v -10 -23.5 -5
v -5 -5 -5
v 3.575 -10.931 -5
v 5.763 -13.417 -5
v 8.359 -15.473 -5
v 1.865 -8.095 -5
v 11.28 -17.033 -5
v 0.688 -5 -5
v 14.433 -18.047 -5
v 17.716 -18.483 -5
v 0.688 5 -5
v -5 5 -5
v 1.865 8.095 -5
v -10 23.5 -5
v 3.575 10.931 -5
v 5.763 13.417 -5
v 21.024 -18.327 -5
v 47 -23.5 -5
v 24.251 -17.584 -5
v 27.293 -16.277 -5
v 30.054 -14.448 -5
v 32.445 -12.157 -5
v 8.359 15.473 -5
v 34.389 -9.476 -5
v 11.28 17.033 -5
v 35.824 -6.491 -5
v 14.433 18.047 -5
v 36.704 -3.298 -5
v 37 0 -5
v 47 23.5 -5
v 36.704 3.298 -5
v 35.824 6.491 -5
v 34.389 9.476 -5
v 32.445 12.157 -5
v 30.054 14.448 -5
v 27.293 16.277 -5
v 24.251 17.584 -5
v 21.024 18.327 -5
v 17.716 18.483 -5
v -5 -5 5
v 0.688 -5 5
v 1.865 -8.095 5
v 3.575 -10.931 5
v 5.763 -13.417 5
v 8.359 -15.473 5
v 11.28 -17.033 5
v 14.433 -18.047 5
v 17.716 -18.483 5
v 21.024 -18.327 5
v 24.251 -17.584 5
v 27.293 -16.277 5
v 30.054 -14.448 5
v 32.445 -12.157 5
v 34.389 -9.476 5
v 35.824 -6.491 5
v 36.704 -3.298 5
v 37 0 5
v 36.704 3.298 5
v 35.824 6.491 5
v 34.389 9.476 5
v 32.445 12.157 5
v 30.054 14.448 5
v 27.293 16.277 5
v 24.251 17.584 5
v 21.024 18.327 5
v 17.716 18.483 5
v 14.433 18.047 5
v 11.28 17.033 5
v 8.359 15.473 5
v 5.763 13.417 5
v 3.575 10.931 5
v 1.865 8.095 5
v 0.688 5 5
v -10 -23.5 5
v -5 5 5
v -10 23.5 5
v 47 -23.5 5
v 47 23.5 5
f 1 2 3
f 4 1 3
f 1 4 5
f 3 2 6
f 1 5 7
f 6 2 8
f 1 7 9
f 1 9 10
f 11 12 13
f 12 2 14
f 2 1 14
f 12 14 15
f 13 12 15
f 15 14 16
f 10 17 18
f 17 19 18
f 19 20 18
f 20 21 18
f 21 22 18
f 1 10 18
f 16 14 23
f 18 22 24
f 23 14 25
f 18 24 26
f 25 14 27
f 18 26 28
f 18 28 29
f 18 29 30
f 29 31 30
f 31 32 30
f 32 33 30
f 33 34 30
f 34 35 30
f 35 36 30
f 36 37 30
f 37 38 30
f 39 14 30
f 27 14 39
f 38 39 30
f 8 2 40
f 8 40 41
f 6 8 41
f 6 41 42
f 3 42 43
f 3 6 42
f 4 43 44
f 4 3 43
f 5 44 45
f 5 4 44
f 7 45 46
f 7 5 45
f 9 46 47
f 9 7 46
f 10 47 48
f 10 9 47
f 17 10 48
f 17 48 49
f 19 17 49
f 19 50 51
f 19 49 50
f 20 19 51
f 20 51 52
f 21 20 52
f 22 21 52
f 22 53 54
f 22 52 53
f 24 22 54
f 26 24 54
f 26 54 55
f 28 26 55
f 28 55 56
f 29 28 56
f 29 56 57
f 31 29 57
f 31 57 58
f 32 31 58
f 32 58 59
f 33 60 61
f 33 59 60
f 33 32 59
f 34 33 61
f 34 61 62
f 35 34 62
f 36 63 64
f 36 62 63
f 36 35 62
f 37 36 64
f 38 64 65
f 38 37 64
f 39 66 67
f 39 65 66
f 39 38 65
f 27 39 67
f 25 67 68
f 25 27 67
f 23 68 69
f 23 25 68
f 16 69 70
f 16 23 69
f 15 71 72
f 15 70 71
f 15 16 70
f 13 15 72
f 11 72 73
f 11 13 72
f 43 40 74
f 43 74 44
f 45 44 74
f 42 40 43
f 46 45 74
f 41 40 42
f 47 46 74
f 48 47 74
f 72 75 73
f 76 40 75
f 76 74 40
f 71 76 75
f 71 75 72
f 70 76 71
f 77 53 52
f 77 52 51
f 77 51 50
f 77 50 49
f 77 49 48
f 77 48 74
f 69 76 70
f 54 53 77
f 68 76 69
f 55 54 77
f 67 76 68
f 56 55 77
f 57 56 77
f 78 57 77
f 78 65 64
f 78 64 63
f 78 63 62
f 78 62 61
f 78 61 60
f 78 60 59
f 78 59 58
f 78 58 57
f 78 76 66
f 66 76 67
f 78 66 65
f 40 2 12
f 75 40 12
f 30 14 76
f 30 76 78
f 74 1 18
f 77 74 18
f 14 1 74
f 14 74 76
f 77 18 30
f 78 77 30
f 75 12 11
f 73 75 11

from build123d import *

# Parameters (mm, degrees)
CYLINDER_R     = 18.5
CYLINDER_DEPTH = 10
BOX001_W       = 10
BOX001_H       = 10
BOX001_DEPTH   = 10
BOX_W          = 57
BOX_H          = 47
BOX_DEPTH      = 10


with BuildPart() as cylinder:
    # Cylinder → Cylinder (new body)
    with BuildSketch(Plane(origin=(18.5, 0, -5), x_dir=(1, 0, 0), z_dir=(0, 0, 1))):
        Circle(CYLINDER_R)
    extrude(amount=CYLINDER_DEPTH)


with BuildPart() as fusion:
    # Box001 → Box001 (new body)
    with BuildSketch(Plane(origin=(-5, -5, -5), x_dir=(1, 0, 0), z_dir=(0, 0, 1))):
        with Locations((5, 5)):
            Rectangle(BOX001_W, BOX001_H)
    extrude(amount=BOX001_DEPTH)

    # Fusion: union Cylinder
    add(cylinder.part)


with BuildPart() as cut:
    # Box → Box (new body)
    with BuildSketch(Plane(origin=(-10, -23.5, -5), x_dir=(1, 0, 0), z_dir=(0, 0, 1))):
        with Locations((28.5, 23.5)):
            Rectangle(BOX_W, BOX_H)
    extrude(amount=BOX_DEPTH)

    # Cut: cut Fusion
    add(fusion.part, mode=Mode.SUBTRACT)


solid = cut.part
